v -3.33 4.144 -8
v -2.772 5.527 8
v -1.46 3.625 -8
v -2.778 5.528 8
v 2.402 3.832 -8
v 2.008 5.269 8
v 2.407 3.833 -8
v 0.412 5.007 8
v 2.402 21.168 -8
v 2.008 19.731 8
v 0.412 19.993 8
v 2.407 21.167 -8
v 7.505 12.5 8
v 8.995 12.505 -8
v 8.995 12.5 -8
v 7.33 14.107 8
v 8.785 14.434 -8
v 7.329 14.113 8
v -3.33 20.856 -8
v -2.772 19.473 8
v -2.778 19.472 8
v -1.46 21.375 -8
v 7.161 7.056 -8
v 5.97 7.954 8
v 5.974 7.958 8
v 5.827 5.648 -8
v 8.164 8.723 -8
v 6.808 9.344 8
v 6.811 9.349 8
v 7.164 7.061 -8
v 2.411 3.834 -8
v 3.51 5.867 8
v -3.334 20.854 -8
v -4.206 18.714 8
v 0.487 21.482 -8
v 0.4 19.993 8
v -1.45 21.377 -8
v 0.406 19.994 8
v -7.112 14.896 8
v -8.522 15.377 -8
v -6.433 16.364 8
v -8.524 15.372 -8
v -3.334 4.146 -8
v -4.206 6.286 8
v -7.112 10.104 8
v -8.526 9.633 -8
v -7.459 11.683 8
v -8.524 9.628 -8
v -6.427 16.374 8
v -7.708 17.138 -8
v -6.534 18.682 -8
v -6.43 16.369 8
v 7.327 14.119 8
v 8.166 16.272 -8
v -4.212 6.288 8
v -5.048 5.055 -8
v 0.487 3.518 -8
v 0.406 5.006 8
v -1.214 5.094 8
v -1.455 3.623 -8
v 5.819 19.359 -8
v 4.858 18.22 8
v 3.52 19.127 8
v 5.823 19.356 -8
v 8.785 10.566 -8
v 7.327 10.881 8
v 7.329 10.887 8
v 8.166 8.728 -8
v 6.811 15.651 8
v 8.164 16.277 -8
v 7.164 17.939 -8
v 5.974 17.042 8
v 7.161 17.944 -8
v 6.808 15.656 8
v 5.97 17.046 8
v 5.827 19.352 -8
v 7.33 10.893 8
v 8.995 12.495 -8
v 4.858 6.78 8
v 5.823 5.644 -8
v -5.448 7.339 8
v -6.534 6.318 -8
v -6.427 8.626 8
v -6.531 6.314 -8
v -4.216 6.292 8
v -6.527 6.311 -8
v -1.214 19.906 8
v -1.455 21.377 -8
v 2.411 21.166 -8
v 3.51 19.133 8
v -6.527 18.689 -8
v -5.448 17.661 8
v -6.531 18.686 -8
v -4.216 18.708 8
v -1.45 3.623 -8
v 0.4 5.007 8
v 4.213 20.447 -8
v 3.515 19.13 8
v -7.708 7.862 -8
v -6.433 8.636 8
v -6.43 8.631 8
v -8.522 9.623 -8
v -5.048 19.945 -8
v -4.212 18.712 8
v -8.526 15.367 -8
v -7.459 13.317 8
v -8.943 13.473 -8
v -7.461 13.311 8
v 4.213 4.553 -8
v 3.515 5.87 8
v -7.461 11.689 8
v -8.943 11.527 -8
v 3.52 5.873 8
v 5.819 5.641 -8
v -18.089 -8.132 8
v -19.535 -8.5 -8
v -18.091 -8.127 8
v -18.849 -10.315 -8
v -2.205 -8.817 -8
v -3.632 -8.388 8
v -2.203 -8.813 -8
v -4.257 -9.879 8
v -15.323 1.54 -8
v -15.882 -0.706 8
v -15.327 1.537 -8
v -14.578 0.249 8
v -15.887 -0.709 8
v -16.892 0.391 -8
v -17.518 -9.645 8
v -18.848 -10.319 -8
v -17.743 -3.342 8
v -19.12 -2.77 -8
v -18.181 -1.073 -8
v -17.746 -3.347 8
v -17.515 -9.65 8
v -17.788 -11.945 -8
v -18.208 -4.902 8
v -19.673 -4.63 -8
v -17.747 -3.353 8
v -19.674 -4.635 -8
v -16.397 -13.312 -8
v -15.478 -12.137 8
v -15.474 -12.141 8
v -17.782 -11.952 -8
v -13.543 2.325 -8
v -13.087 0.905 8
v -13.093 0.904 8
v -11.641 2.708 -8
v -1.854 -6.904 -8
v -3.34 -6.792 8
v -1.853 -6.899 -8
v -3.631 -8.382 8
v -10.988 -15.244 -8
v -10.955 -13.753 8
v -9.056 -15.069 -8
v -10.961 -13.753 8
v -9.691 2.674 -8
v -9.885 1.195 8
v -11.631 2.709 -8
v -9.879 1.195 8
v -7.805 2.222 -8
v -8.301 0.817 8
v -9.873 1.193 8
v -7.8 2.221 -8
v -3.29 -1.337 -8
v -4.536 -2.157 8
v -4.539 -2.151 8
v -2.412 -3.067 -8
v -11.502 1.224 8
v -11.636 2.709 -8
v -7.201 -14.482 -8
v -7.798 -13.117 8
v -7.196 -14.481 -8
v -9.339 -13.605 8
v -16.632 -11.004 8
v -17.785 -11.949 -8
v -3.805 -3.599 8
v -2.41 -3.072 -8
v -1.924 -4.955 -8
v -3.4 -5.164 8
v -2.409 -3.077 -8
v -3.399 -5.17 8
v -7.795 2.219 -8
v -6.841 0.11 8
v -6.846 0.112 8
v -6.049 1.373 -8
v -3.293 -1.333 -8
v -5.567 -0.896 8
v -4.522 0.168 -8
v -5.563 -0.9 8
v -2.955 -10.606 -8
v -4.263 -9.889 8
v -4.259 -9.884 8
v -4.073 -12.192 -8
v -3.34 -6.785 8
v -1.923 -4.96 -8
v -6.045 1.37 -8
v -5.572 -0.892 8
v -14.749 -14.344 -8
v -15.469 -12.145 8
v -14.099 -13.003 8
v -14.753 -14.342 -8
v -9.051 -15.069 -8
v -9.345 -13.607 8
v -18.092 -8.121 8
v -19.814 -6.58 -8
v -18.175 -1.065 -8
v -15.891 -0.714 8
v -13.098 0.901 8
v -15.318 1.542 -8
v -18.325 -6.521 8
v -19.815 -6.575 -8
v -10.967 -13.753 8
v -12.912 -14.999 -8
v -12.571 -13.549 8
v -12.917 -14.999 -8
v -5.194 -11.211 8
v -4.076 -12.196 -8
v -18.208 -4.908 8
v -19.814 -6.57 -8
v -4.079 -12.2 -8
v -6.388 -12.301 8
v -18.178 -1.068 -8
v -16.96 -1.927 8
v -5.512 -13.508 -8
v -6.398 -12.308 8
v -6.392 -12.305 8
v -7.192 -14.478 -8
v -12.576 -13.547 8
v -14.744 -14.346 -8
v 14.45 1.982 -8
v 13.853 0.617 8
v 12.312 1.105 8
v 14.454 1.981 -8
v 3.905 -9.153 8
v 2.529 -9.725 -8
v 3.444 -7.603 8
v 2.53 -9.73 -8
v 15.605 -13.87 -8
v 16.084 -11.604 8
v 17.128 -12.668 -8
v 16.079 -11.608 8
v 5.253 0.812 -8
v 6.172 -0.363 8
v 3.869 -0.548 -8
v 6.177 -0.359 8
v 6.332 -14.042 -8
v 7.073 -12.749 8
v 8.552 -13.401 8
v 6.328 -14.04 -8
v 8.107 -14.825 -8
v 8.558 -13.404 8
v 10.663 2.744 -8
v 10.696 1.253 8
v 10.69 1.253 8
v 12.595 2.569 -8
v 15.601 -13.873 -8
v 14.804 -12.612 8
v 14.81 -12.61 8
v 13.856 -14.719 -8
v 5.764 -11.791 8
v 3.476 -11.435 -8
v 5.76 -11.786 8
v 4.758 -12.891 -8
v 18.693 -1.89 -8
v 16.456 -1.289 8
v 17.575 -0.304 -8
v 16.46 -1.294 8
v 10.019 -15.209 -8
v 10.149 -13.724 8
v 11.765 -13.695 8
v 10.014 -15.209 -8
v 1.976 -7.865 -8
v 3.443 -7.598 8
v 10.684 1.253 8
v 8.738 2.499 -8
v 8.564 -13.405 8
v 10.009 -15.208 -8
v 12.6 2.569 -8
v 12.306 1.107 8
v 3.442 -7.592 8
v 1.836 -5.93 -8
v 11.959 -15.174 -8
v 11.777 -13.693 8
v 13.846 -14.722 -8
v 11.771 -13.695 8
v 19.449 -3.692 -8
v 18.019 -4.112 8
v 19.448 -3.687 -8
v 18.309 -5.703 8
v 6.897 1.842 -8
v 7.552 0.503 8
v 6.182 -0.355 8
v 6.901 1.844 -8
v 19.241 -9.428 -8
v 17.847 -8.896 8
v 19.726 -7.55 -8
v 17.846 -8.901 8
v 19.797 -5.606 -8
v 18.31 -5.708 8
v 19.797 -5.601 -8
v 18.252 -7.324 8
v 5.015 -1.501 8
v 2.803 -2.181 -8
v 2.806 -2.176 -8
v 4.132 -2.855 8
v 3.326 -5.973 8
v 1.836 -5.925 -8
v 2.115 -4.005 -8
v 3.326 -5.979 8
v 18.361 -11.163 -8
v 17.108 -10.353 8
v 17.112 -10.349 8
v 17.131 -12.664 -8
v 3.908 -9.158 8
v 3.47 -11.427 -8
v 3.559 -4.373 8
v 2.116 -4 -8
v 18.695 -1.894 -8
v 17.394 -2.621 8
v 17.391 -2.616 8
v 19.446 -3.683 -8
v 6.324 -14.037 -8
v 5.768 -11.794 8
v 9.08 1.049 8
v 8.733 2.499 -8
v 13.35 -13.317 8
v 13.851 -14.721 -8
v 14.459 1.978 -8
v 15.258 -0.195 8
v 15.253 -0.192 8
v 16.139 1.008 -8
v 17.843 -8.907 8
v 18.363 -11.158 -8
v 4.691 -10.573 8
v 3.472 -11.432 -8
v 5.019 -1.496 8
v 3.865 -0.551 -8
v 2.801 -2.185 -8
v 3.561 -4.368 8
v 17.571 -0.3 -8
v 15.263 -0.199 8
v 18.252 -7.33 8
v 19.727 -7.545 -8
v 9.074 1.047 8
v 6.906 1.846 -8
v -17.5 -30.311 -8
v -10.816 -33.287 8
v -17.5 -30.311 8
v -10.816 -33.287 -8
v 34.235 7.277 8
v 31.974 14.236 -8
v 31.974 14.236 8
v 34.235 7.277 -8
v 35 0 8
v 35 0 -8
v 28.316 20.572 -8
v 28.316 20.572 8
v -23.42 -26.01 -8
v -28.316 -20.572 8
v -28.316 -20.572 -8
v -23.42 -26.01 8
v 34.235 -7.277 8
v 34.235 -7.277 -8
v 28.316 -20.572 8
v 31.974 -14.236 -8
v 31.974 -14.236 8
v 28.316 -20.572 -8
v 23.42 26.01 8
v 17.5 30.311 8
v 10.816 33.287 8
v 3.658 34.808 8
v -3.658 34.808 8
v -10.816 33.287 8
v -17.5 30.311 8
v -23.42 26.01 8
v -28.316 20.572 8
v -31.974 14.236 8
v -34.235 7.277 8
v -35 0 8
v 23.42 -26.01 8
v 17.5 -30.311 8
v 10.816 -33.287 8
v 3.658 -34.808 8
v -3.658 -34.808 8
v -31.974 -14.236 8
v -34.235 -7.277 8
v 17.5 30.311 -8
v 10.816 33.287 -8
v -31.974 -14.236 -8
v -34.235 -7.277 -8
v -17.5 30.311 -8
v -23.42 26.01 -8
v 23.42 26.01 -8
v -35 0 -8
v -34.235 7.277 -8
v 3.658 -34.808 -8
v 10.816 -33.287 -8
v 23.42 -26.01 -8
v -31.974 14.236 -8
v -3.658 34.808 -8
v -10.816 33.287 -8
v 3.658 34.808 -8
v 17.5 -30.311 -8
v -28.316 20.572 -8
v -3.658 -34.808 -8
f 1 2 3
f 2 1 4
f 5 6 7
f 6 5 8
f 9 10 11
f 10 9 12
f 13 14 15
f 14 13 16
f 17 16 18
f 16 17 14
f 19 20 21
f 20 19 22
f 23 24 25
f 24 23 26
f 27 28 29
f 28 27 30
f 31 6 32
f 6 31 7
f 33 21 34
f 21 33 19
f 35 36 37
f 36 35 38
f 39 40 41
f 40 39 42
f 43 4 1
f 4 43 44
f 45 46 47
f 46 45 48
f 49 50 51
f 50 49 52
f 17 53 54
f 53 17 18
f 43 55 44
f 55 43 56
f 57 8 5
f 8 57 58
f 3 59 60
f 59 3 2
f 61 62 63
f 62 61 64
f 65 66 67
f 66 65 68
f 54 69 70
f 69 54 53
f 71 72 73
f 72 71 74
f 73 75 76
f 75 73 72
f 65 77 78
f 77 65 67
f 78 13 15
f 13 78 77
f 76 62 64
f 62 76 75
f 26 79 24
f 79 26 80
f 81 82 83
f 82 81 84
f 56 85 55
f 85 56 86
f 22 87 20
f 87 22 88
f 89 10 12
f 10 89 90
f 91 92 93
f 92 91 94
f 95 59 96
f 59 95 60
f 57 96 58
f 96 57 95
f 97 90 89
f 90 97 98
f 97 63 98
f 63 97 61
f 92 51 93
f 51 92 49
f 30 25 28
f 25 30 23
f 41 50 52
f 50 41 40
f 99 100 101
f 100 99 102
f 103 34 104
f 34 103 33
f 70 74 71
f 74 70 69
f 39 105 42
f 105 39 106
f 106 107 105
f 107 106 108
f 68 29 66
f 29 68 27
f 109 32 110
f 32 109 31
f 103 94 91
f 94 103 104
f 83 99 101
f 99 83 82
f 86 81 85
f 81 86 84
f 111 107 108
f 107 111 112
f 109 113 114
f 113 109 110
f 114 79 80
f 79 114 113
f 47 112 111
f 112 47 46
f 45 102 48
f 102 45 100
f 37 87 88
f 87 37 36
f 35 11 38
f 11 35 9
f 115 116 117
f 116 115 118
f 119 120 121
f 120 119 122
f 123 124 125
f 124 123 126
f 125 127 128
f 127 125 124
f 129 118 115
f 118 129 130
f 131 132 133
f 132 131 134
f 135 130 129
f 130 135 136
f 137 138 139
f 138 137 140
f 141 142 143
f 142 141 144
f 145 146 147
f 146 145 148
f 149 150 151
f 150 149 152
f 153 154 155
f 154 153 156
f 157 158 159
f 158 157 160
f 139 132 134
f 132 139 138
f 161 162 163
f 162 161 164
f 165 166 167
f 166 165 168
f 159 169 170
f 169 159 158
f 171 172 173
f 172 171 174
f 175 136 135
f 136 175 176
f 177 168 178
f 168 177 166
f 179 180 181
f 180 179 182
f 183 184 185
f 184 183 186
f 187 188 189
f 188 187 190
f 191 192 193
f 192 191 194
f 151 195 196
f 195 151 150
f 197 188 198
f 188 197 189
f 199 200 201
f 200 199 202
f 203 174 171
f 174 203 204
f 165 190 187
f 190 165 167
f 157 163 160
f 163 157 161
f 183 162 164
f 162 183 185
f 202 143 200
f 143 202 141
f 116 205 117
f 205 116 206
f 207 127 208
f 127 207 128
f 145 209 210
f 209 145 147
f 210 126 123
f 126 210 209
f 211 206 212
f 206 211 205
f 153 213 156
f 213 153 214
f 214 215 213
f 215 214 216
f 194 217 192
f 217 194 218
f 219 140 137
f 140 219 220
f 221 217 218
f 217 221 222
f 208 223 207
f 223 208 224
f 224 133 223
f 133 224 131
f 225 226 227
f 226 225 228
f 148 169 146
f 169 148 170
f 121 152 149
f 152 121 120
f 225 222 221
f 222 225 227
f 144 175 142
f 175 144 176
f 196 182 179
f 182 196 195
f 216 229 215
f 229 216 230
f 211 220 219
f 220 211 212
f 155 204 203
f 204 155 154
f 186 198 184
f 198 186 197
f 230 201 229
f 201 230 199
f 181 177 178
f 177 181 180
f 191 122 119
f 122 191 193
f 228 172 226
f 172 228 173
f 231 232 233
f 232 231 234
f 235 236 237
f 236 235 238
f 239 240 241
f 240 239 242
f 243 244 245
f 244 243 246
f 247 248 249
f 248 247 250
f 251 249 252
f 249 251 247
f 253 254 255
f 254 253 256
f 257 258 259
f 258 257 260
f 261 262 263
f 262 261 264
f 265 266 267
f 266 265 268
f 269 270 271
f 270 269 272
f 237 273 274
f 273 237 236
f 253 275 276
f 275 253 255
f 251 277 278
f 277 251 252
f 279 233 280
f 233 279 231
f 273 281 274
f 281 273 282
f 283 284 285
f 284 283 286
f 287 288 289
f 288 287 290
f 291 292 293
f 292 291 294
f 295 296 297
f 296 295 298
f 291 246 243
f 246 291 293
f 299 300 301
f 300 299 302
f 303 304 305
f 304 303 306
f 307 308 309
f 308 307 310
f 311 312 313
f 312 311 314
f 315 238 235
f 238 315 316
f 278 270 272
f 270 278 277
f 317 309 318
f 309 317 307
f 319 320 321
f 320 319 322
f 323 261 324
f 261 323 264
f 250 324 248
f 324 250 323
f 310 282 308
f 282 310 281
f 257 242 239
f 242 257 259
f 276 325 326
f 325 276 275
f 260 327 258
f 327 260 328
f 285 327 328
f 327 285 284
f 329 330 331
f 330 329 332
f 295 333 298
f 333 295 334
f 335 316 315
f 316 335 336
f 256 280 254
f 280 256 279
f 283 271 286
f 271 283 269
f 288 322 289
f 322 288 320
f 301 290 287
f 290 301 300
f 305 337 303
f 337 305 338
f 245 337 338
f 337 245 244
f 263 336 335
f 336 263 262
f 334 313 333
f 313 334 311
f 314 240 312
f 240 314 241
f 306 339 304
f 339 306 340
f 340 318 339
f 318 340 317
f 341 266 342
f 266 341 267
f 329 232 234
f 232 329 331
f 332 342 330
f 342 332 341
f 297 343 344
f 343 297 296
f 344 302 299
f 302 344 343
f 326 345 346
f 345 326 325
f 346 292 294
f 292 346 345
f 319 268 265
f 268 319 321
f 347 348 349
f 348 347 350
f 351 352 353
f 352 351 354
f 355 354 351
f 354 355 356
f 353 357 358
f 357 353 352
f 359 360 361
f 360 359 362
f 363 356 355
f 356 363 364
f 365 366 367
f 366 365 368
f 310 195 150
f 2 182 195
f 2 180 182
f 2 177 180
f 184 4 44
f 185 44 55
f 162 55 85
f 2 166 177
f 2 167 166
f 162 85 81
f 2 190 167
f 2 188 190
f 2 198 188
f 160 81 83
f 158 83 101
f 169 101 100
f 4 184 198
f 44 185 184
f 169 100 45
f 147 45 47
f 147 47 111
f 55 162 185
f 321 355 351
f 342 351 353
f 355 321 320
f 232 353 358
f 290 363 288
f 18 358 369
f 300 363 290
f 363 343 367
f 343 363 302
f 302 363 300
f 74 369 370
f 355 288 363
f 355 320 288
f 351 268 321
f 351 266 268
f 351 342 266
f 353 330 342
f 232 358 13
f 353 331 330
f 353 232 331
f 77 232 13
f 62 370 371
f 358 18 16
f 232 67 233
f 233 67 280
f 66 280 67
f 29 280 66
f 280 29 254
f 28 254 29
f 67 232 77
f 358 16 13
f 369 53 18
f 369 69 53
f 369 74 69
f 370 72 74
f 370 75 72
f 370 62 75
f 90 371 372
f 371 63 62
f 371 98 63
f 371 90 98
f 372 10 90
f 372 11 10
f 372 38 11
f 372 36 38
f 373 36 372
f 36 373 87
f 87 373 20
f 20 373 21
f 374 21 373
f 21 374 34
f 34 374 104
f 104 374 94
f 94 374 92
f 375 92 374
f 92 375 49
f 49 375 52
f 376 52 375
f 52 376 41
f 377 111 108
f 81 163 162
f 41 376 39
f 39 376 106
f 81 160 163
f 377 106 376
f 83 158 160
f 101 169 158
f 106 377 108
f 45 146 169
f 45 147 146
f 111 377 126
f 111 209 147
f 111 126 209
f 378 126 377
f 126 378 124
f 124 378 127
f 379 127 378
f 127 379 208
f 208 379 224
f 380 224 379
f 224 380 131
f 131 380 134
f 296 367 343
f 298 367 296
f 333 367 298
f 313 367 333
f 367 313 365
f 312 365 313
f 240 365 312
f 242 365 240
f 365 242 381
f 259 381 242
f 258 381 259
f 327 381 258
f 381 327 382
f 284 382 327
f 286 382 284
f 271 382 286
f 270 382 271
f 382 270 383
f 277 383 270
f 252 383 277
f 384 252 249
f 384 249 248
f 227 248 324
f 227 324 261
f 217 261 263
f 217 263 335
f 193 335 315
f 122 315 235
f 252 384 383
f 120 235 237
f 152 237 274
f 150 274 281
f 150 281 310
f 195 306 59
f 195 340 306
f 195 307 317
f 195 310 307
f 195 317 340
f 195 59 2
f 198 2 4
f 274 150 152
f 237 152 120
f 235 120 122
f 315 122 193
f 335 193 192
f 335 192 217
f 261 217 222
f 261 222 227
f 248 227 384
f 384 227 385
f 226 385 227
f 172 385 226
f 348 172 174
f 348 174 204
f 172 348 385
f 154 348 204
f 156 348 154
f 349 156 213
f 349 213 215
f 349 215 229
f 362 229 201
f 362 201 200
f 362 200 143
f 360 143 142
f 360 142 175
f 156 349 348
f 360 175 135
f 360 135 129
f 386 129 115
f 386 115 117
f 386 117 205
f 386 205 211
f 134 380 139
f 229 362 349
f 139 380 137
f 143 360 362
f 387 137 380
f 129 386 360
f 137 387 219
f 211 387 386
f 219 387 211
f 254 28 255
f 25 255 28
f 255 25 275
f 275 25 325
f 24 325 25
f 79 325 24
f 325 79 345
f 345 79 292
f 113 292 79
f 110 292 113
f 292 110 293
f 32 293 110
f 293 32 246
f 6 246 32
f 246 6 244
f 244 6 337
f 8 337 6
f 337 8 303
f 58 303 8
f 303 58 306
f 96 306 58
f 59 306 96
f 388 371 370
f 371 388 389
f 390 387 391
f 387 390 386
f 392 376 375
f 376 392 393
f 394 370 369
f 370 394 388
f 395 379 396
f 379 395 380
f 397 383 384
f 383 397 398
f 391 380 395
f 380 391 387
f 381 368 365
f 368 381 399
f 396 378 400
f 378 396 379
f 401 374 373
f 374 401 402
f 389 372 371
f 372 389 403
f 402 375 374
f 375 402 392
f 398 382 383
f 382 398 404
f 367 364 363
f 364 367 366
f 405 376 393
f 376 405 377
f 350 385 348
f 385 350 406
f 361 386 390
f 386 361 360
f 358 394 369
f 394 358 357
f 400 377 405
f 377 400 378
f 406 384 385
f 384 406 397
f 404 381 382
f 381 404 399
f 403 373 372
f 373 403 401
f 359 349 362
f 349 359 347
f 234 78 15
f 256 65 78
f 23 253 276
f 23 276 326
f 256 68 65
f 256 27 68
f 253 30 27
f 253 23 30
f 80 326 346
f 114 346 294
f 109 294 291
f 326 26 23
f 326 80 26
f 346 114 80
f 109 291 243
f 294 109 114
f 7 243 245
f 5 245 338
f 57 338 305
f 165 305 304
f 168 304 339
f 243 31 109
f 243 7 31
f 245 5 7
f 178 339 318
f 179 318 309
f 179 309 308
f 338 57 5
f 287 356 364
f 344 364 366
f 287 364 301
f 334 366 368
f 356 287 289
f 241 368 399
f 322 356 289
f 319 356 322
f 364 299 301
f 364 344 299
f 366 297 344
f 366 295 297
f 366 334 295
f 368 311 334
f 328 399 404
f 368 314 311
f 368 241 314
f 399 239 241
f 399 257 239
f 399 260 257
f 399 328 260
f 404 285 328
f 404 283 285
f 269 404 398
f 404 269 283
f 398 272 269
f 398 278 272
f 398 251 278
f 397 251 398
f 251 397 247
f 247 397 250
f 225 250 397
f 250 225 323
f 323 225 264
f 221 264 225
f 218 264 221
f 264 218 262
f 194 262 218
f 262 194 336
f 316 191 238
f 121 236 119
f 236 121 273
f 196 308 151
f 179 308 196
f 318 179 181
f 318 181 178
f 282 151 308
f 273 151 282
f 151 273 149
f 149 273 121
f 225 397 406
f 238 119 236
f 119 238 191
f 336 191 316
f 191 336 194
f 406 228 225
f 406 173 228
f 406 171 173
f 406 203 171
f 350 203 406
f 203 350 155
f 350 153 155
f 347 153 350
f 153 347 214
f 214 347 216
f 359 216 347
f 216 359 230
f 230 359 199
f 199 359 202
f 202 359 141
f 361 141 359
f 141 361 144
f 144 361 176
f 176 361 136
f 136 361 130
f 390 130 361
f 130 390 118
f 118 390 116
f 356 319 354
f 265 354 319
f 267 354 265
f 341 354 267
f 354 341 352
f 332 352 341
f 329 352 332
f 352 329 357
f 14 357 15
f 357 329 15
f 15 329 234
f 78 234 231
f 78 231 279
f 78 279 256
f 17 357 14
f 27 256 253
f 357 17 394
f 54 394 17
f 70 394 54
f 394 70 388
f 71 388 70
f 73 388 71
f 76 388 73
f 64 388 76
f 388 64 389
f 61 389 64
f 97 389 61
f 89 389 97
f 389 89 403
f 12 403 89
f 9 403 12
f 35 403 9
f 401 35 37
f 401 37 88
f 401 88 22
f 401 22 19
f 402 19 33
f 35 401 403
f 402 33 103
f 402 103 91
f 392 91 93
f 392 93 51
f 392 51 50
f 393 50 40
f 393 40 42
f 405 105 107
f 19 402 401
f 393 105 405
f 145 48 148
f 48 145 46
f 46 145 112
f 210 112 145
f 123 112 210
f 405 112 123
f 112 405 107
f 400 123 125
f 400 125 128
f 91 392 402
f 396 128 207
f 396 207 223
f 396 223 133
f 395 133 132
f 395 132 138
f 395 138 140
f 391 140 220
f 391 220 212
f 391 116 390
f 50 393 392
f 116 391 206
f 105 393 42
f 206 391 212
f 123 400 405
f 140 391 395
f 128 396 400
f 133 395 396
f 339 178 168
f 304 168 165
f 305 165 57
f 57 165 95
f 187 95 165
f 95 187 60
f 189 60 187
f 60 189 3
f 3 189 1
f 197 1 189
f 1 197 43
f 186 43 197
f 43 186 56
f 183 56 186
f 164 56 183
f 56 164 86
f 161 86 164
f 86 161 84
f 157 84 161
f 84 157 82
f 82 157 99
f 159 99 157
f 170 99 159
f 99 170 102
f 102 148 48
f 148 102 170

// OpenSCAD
difference() 
{
    cylinder(16,70/2,70/2,true);
    //Holes for magnets
    for (r=[0:2])
    {
        rotate([0,0,r*120])
        {
            translate([0,12.5,0] )
            cylinder(16.1,18/2,15/2,true);
        }
    }
}
